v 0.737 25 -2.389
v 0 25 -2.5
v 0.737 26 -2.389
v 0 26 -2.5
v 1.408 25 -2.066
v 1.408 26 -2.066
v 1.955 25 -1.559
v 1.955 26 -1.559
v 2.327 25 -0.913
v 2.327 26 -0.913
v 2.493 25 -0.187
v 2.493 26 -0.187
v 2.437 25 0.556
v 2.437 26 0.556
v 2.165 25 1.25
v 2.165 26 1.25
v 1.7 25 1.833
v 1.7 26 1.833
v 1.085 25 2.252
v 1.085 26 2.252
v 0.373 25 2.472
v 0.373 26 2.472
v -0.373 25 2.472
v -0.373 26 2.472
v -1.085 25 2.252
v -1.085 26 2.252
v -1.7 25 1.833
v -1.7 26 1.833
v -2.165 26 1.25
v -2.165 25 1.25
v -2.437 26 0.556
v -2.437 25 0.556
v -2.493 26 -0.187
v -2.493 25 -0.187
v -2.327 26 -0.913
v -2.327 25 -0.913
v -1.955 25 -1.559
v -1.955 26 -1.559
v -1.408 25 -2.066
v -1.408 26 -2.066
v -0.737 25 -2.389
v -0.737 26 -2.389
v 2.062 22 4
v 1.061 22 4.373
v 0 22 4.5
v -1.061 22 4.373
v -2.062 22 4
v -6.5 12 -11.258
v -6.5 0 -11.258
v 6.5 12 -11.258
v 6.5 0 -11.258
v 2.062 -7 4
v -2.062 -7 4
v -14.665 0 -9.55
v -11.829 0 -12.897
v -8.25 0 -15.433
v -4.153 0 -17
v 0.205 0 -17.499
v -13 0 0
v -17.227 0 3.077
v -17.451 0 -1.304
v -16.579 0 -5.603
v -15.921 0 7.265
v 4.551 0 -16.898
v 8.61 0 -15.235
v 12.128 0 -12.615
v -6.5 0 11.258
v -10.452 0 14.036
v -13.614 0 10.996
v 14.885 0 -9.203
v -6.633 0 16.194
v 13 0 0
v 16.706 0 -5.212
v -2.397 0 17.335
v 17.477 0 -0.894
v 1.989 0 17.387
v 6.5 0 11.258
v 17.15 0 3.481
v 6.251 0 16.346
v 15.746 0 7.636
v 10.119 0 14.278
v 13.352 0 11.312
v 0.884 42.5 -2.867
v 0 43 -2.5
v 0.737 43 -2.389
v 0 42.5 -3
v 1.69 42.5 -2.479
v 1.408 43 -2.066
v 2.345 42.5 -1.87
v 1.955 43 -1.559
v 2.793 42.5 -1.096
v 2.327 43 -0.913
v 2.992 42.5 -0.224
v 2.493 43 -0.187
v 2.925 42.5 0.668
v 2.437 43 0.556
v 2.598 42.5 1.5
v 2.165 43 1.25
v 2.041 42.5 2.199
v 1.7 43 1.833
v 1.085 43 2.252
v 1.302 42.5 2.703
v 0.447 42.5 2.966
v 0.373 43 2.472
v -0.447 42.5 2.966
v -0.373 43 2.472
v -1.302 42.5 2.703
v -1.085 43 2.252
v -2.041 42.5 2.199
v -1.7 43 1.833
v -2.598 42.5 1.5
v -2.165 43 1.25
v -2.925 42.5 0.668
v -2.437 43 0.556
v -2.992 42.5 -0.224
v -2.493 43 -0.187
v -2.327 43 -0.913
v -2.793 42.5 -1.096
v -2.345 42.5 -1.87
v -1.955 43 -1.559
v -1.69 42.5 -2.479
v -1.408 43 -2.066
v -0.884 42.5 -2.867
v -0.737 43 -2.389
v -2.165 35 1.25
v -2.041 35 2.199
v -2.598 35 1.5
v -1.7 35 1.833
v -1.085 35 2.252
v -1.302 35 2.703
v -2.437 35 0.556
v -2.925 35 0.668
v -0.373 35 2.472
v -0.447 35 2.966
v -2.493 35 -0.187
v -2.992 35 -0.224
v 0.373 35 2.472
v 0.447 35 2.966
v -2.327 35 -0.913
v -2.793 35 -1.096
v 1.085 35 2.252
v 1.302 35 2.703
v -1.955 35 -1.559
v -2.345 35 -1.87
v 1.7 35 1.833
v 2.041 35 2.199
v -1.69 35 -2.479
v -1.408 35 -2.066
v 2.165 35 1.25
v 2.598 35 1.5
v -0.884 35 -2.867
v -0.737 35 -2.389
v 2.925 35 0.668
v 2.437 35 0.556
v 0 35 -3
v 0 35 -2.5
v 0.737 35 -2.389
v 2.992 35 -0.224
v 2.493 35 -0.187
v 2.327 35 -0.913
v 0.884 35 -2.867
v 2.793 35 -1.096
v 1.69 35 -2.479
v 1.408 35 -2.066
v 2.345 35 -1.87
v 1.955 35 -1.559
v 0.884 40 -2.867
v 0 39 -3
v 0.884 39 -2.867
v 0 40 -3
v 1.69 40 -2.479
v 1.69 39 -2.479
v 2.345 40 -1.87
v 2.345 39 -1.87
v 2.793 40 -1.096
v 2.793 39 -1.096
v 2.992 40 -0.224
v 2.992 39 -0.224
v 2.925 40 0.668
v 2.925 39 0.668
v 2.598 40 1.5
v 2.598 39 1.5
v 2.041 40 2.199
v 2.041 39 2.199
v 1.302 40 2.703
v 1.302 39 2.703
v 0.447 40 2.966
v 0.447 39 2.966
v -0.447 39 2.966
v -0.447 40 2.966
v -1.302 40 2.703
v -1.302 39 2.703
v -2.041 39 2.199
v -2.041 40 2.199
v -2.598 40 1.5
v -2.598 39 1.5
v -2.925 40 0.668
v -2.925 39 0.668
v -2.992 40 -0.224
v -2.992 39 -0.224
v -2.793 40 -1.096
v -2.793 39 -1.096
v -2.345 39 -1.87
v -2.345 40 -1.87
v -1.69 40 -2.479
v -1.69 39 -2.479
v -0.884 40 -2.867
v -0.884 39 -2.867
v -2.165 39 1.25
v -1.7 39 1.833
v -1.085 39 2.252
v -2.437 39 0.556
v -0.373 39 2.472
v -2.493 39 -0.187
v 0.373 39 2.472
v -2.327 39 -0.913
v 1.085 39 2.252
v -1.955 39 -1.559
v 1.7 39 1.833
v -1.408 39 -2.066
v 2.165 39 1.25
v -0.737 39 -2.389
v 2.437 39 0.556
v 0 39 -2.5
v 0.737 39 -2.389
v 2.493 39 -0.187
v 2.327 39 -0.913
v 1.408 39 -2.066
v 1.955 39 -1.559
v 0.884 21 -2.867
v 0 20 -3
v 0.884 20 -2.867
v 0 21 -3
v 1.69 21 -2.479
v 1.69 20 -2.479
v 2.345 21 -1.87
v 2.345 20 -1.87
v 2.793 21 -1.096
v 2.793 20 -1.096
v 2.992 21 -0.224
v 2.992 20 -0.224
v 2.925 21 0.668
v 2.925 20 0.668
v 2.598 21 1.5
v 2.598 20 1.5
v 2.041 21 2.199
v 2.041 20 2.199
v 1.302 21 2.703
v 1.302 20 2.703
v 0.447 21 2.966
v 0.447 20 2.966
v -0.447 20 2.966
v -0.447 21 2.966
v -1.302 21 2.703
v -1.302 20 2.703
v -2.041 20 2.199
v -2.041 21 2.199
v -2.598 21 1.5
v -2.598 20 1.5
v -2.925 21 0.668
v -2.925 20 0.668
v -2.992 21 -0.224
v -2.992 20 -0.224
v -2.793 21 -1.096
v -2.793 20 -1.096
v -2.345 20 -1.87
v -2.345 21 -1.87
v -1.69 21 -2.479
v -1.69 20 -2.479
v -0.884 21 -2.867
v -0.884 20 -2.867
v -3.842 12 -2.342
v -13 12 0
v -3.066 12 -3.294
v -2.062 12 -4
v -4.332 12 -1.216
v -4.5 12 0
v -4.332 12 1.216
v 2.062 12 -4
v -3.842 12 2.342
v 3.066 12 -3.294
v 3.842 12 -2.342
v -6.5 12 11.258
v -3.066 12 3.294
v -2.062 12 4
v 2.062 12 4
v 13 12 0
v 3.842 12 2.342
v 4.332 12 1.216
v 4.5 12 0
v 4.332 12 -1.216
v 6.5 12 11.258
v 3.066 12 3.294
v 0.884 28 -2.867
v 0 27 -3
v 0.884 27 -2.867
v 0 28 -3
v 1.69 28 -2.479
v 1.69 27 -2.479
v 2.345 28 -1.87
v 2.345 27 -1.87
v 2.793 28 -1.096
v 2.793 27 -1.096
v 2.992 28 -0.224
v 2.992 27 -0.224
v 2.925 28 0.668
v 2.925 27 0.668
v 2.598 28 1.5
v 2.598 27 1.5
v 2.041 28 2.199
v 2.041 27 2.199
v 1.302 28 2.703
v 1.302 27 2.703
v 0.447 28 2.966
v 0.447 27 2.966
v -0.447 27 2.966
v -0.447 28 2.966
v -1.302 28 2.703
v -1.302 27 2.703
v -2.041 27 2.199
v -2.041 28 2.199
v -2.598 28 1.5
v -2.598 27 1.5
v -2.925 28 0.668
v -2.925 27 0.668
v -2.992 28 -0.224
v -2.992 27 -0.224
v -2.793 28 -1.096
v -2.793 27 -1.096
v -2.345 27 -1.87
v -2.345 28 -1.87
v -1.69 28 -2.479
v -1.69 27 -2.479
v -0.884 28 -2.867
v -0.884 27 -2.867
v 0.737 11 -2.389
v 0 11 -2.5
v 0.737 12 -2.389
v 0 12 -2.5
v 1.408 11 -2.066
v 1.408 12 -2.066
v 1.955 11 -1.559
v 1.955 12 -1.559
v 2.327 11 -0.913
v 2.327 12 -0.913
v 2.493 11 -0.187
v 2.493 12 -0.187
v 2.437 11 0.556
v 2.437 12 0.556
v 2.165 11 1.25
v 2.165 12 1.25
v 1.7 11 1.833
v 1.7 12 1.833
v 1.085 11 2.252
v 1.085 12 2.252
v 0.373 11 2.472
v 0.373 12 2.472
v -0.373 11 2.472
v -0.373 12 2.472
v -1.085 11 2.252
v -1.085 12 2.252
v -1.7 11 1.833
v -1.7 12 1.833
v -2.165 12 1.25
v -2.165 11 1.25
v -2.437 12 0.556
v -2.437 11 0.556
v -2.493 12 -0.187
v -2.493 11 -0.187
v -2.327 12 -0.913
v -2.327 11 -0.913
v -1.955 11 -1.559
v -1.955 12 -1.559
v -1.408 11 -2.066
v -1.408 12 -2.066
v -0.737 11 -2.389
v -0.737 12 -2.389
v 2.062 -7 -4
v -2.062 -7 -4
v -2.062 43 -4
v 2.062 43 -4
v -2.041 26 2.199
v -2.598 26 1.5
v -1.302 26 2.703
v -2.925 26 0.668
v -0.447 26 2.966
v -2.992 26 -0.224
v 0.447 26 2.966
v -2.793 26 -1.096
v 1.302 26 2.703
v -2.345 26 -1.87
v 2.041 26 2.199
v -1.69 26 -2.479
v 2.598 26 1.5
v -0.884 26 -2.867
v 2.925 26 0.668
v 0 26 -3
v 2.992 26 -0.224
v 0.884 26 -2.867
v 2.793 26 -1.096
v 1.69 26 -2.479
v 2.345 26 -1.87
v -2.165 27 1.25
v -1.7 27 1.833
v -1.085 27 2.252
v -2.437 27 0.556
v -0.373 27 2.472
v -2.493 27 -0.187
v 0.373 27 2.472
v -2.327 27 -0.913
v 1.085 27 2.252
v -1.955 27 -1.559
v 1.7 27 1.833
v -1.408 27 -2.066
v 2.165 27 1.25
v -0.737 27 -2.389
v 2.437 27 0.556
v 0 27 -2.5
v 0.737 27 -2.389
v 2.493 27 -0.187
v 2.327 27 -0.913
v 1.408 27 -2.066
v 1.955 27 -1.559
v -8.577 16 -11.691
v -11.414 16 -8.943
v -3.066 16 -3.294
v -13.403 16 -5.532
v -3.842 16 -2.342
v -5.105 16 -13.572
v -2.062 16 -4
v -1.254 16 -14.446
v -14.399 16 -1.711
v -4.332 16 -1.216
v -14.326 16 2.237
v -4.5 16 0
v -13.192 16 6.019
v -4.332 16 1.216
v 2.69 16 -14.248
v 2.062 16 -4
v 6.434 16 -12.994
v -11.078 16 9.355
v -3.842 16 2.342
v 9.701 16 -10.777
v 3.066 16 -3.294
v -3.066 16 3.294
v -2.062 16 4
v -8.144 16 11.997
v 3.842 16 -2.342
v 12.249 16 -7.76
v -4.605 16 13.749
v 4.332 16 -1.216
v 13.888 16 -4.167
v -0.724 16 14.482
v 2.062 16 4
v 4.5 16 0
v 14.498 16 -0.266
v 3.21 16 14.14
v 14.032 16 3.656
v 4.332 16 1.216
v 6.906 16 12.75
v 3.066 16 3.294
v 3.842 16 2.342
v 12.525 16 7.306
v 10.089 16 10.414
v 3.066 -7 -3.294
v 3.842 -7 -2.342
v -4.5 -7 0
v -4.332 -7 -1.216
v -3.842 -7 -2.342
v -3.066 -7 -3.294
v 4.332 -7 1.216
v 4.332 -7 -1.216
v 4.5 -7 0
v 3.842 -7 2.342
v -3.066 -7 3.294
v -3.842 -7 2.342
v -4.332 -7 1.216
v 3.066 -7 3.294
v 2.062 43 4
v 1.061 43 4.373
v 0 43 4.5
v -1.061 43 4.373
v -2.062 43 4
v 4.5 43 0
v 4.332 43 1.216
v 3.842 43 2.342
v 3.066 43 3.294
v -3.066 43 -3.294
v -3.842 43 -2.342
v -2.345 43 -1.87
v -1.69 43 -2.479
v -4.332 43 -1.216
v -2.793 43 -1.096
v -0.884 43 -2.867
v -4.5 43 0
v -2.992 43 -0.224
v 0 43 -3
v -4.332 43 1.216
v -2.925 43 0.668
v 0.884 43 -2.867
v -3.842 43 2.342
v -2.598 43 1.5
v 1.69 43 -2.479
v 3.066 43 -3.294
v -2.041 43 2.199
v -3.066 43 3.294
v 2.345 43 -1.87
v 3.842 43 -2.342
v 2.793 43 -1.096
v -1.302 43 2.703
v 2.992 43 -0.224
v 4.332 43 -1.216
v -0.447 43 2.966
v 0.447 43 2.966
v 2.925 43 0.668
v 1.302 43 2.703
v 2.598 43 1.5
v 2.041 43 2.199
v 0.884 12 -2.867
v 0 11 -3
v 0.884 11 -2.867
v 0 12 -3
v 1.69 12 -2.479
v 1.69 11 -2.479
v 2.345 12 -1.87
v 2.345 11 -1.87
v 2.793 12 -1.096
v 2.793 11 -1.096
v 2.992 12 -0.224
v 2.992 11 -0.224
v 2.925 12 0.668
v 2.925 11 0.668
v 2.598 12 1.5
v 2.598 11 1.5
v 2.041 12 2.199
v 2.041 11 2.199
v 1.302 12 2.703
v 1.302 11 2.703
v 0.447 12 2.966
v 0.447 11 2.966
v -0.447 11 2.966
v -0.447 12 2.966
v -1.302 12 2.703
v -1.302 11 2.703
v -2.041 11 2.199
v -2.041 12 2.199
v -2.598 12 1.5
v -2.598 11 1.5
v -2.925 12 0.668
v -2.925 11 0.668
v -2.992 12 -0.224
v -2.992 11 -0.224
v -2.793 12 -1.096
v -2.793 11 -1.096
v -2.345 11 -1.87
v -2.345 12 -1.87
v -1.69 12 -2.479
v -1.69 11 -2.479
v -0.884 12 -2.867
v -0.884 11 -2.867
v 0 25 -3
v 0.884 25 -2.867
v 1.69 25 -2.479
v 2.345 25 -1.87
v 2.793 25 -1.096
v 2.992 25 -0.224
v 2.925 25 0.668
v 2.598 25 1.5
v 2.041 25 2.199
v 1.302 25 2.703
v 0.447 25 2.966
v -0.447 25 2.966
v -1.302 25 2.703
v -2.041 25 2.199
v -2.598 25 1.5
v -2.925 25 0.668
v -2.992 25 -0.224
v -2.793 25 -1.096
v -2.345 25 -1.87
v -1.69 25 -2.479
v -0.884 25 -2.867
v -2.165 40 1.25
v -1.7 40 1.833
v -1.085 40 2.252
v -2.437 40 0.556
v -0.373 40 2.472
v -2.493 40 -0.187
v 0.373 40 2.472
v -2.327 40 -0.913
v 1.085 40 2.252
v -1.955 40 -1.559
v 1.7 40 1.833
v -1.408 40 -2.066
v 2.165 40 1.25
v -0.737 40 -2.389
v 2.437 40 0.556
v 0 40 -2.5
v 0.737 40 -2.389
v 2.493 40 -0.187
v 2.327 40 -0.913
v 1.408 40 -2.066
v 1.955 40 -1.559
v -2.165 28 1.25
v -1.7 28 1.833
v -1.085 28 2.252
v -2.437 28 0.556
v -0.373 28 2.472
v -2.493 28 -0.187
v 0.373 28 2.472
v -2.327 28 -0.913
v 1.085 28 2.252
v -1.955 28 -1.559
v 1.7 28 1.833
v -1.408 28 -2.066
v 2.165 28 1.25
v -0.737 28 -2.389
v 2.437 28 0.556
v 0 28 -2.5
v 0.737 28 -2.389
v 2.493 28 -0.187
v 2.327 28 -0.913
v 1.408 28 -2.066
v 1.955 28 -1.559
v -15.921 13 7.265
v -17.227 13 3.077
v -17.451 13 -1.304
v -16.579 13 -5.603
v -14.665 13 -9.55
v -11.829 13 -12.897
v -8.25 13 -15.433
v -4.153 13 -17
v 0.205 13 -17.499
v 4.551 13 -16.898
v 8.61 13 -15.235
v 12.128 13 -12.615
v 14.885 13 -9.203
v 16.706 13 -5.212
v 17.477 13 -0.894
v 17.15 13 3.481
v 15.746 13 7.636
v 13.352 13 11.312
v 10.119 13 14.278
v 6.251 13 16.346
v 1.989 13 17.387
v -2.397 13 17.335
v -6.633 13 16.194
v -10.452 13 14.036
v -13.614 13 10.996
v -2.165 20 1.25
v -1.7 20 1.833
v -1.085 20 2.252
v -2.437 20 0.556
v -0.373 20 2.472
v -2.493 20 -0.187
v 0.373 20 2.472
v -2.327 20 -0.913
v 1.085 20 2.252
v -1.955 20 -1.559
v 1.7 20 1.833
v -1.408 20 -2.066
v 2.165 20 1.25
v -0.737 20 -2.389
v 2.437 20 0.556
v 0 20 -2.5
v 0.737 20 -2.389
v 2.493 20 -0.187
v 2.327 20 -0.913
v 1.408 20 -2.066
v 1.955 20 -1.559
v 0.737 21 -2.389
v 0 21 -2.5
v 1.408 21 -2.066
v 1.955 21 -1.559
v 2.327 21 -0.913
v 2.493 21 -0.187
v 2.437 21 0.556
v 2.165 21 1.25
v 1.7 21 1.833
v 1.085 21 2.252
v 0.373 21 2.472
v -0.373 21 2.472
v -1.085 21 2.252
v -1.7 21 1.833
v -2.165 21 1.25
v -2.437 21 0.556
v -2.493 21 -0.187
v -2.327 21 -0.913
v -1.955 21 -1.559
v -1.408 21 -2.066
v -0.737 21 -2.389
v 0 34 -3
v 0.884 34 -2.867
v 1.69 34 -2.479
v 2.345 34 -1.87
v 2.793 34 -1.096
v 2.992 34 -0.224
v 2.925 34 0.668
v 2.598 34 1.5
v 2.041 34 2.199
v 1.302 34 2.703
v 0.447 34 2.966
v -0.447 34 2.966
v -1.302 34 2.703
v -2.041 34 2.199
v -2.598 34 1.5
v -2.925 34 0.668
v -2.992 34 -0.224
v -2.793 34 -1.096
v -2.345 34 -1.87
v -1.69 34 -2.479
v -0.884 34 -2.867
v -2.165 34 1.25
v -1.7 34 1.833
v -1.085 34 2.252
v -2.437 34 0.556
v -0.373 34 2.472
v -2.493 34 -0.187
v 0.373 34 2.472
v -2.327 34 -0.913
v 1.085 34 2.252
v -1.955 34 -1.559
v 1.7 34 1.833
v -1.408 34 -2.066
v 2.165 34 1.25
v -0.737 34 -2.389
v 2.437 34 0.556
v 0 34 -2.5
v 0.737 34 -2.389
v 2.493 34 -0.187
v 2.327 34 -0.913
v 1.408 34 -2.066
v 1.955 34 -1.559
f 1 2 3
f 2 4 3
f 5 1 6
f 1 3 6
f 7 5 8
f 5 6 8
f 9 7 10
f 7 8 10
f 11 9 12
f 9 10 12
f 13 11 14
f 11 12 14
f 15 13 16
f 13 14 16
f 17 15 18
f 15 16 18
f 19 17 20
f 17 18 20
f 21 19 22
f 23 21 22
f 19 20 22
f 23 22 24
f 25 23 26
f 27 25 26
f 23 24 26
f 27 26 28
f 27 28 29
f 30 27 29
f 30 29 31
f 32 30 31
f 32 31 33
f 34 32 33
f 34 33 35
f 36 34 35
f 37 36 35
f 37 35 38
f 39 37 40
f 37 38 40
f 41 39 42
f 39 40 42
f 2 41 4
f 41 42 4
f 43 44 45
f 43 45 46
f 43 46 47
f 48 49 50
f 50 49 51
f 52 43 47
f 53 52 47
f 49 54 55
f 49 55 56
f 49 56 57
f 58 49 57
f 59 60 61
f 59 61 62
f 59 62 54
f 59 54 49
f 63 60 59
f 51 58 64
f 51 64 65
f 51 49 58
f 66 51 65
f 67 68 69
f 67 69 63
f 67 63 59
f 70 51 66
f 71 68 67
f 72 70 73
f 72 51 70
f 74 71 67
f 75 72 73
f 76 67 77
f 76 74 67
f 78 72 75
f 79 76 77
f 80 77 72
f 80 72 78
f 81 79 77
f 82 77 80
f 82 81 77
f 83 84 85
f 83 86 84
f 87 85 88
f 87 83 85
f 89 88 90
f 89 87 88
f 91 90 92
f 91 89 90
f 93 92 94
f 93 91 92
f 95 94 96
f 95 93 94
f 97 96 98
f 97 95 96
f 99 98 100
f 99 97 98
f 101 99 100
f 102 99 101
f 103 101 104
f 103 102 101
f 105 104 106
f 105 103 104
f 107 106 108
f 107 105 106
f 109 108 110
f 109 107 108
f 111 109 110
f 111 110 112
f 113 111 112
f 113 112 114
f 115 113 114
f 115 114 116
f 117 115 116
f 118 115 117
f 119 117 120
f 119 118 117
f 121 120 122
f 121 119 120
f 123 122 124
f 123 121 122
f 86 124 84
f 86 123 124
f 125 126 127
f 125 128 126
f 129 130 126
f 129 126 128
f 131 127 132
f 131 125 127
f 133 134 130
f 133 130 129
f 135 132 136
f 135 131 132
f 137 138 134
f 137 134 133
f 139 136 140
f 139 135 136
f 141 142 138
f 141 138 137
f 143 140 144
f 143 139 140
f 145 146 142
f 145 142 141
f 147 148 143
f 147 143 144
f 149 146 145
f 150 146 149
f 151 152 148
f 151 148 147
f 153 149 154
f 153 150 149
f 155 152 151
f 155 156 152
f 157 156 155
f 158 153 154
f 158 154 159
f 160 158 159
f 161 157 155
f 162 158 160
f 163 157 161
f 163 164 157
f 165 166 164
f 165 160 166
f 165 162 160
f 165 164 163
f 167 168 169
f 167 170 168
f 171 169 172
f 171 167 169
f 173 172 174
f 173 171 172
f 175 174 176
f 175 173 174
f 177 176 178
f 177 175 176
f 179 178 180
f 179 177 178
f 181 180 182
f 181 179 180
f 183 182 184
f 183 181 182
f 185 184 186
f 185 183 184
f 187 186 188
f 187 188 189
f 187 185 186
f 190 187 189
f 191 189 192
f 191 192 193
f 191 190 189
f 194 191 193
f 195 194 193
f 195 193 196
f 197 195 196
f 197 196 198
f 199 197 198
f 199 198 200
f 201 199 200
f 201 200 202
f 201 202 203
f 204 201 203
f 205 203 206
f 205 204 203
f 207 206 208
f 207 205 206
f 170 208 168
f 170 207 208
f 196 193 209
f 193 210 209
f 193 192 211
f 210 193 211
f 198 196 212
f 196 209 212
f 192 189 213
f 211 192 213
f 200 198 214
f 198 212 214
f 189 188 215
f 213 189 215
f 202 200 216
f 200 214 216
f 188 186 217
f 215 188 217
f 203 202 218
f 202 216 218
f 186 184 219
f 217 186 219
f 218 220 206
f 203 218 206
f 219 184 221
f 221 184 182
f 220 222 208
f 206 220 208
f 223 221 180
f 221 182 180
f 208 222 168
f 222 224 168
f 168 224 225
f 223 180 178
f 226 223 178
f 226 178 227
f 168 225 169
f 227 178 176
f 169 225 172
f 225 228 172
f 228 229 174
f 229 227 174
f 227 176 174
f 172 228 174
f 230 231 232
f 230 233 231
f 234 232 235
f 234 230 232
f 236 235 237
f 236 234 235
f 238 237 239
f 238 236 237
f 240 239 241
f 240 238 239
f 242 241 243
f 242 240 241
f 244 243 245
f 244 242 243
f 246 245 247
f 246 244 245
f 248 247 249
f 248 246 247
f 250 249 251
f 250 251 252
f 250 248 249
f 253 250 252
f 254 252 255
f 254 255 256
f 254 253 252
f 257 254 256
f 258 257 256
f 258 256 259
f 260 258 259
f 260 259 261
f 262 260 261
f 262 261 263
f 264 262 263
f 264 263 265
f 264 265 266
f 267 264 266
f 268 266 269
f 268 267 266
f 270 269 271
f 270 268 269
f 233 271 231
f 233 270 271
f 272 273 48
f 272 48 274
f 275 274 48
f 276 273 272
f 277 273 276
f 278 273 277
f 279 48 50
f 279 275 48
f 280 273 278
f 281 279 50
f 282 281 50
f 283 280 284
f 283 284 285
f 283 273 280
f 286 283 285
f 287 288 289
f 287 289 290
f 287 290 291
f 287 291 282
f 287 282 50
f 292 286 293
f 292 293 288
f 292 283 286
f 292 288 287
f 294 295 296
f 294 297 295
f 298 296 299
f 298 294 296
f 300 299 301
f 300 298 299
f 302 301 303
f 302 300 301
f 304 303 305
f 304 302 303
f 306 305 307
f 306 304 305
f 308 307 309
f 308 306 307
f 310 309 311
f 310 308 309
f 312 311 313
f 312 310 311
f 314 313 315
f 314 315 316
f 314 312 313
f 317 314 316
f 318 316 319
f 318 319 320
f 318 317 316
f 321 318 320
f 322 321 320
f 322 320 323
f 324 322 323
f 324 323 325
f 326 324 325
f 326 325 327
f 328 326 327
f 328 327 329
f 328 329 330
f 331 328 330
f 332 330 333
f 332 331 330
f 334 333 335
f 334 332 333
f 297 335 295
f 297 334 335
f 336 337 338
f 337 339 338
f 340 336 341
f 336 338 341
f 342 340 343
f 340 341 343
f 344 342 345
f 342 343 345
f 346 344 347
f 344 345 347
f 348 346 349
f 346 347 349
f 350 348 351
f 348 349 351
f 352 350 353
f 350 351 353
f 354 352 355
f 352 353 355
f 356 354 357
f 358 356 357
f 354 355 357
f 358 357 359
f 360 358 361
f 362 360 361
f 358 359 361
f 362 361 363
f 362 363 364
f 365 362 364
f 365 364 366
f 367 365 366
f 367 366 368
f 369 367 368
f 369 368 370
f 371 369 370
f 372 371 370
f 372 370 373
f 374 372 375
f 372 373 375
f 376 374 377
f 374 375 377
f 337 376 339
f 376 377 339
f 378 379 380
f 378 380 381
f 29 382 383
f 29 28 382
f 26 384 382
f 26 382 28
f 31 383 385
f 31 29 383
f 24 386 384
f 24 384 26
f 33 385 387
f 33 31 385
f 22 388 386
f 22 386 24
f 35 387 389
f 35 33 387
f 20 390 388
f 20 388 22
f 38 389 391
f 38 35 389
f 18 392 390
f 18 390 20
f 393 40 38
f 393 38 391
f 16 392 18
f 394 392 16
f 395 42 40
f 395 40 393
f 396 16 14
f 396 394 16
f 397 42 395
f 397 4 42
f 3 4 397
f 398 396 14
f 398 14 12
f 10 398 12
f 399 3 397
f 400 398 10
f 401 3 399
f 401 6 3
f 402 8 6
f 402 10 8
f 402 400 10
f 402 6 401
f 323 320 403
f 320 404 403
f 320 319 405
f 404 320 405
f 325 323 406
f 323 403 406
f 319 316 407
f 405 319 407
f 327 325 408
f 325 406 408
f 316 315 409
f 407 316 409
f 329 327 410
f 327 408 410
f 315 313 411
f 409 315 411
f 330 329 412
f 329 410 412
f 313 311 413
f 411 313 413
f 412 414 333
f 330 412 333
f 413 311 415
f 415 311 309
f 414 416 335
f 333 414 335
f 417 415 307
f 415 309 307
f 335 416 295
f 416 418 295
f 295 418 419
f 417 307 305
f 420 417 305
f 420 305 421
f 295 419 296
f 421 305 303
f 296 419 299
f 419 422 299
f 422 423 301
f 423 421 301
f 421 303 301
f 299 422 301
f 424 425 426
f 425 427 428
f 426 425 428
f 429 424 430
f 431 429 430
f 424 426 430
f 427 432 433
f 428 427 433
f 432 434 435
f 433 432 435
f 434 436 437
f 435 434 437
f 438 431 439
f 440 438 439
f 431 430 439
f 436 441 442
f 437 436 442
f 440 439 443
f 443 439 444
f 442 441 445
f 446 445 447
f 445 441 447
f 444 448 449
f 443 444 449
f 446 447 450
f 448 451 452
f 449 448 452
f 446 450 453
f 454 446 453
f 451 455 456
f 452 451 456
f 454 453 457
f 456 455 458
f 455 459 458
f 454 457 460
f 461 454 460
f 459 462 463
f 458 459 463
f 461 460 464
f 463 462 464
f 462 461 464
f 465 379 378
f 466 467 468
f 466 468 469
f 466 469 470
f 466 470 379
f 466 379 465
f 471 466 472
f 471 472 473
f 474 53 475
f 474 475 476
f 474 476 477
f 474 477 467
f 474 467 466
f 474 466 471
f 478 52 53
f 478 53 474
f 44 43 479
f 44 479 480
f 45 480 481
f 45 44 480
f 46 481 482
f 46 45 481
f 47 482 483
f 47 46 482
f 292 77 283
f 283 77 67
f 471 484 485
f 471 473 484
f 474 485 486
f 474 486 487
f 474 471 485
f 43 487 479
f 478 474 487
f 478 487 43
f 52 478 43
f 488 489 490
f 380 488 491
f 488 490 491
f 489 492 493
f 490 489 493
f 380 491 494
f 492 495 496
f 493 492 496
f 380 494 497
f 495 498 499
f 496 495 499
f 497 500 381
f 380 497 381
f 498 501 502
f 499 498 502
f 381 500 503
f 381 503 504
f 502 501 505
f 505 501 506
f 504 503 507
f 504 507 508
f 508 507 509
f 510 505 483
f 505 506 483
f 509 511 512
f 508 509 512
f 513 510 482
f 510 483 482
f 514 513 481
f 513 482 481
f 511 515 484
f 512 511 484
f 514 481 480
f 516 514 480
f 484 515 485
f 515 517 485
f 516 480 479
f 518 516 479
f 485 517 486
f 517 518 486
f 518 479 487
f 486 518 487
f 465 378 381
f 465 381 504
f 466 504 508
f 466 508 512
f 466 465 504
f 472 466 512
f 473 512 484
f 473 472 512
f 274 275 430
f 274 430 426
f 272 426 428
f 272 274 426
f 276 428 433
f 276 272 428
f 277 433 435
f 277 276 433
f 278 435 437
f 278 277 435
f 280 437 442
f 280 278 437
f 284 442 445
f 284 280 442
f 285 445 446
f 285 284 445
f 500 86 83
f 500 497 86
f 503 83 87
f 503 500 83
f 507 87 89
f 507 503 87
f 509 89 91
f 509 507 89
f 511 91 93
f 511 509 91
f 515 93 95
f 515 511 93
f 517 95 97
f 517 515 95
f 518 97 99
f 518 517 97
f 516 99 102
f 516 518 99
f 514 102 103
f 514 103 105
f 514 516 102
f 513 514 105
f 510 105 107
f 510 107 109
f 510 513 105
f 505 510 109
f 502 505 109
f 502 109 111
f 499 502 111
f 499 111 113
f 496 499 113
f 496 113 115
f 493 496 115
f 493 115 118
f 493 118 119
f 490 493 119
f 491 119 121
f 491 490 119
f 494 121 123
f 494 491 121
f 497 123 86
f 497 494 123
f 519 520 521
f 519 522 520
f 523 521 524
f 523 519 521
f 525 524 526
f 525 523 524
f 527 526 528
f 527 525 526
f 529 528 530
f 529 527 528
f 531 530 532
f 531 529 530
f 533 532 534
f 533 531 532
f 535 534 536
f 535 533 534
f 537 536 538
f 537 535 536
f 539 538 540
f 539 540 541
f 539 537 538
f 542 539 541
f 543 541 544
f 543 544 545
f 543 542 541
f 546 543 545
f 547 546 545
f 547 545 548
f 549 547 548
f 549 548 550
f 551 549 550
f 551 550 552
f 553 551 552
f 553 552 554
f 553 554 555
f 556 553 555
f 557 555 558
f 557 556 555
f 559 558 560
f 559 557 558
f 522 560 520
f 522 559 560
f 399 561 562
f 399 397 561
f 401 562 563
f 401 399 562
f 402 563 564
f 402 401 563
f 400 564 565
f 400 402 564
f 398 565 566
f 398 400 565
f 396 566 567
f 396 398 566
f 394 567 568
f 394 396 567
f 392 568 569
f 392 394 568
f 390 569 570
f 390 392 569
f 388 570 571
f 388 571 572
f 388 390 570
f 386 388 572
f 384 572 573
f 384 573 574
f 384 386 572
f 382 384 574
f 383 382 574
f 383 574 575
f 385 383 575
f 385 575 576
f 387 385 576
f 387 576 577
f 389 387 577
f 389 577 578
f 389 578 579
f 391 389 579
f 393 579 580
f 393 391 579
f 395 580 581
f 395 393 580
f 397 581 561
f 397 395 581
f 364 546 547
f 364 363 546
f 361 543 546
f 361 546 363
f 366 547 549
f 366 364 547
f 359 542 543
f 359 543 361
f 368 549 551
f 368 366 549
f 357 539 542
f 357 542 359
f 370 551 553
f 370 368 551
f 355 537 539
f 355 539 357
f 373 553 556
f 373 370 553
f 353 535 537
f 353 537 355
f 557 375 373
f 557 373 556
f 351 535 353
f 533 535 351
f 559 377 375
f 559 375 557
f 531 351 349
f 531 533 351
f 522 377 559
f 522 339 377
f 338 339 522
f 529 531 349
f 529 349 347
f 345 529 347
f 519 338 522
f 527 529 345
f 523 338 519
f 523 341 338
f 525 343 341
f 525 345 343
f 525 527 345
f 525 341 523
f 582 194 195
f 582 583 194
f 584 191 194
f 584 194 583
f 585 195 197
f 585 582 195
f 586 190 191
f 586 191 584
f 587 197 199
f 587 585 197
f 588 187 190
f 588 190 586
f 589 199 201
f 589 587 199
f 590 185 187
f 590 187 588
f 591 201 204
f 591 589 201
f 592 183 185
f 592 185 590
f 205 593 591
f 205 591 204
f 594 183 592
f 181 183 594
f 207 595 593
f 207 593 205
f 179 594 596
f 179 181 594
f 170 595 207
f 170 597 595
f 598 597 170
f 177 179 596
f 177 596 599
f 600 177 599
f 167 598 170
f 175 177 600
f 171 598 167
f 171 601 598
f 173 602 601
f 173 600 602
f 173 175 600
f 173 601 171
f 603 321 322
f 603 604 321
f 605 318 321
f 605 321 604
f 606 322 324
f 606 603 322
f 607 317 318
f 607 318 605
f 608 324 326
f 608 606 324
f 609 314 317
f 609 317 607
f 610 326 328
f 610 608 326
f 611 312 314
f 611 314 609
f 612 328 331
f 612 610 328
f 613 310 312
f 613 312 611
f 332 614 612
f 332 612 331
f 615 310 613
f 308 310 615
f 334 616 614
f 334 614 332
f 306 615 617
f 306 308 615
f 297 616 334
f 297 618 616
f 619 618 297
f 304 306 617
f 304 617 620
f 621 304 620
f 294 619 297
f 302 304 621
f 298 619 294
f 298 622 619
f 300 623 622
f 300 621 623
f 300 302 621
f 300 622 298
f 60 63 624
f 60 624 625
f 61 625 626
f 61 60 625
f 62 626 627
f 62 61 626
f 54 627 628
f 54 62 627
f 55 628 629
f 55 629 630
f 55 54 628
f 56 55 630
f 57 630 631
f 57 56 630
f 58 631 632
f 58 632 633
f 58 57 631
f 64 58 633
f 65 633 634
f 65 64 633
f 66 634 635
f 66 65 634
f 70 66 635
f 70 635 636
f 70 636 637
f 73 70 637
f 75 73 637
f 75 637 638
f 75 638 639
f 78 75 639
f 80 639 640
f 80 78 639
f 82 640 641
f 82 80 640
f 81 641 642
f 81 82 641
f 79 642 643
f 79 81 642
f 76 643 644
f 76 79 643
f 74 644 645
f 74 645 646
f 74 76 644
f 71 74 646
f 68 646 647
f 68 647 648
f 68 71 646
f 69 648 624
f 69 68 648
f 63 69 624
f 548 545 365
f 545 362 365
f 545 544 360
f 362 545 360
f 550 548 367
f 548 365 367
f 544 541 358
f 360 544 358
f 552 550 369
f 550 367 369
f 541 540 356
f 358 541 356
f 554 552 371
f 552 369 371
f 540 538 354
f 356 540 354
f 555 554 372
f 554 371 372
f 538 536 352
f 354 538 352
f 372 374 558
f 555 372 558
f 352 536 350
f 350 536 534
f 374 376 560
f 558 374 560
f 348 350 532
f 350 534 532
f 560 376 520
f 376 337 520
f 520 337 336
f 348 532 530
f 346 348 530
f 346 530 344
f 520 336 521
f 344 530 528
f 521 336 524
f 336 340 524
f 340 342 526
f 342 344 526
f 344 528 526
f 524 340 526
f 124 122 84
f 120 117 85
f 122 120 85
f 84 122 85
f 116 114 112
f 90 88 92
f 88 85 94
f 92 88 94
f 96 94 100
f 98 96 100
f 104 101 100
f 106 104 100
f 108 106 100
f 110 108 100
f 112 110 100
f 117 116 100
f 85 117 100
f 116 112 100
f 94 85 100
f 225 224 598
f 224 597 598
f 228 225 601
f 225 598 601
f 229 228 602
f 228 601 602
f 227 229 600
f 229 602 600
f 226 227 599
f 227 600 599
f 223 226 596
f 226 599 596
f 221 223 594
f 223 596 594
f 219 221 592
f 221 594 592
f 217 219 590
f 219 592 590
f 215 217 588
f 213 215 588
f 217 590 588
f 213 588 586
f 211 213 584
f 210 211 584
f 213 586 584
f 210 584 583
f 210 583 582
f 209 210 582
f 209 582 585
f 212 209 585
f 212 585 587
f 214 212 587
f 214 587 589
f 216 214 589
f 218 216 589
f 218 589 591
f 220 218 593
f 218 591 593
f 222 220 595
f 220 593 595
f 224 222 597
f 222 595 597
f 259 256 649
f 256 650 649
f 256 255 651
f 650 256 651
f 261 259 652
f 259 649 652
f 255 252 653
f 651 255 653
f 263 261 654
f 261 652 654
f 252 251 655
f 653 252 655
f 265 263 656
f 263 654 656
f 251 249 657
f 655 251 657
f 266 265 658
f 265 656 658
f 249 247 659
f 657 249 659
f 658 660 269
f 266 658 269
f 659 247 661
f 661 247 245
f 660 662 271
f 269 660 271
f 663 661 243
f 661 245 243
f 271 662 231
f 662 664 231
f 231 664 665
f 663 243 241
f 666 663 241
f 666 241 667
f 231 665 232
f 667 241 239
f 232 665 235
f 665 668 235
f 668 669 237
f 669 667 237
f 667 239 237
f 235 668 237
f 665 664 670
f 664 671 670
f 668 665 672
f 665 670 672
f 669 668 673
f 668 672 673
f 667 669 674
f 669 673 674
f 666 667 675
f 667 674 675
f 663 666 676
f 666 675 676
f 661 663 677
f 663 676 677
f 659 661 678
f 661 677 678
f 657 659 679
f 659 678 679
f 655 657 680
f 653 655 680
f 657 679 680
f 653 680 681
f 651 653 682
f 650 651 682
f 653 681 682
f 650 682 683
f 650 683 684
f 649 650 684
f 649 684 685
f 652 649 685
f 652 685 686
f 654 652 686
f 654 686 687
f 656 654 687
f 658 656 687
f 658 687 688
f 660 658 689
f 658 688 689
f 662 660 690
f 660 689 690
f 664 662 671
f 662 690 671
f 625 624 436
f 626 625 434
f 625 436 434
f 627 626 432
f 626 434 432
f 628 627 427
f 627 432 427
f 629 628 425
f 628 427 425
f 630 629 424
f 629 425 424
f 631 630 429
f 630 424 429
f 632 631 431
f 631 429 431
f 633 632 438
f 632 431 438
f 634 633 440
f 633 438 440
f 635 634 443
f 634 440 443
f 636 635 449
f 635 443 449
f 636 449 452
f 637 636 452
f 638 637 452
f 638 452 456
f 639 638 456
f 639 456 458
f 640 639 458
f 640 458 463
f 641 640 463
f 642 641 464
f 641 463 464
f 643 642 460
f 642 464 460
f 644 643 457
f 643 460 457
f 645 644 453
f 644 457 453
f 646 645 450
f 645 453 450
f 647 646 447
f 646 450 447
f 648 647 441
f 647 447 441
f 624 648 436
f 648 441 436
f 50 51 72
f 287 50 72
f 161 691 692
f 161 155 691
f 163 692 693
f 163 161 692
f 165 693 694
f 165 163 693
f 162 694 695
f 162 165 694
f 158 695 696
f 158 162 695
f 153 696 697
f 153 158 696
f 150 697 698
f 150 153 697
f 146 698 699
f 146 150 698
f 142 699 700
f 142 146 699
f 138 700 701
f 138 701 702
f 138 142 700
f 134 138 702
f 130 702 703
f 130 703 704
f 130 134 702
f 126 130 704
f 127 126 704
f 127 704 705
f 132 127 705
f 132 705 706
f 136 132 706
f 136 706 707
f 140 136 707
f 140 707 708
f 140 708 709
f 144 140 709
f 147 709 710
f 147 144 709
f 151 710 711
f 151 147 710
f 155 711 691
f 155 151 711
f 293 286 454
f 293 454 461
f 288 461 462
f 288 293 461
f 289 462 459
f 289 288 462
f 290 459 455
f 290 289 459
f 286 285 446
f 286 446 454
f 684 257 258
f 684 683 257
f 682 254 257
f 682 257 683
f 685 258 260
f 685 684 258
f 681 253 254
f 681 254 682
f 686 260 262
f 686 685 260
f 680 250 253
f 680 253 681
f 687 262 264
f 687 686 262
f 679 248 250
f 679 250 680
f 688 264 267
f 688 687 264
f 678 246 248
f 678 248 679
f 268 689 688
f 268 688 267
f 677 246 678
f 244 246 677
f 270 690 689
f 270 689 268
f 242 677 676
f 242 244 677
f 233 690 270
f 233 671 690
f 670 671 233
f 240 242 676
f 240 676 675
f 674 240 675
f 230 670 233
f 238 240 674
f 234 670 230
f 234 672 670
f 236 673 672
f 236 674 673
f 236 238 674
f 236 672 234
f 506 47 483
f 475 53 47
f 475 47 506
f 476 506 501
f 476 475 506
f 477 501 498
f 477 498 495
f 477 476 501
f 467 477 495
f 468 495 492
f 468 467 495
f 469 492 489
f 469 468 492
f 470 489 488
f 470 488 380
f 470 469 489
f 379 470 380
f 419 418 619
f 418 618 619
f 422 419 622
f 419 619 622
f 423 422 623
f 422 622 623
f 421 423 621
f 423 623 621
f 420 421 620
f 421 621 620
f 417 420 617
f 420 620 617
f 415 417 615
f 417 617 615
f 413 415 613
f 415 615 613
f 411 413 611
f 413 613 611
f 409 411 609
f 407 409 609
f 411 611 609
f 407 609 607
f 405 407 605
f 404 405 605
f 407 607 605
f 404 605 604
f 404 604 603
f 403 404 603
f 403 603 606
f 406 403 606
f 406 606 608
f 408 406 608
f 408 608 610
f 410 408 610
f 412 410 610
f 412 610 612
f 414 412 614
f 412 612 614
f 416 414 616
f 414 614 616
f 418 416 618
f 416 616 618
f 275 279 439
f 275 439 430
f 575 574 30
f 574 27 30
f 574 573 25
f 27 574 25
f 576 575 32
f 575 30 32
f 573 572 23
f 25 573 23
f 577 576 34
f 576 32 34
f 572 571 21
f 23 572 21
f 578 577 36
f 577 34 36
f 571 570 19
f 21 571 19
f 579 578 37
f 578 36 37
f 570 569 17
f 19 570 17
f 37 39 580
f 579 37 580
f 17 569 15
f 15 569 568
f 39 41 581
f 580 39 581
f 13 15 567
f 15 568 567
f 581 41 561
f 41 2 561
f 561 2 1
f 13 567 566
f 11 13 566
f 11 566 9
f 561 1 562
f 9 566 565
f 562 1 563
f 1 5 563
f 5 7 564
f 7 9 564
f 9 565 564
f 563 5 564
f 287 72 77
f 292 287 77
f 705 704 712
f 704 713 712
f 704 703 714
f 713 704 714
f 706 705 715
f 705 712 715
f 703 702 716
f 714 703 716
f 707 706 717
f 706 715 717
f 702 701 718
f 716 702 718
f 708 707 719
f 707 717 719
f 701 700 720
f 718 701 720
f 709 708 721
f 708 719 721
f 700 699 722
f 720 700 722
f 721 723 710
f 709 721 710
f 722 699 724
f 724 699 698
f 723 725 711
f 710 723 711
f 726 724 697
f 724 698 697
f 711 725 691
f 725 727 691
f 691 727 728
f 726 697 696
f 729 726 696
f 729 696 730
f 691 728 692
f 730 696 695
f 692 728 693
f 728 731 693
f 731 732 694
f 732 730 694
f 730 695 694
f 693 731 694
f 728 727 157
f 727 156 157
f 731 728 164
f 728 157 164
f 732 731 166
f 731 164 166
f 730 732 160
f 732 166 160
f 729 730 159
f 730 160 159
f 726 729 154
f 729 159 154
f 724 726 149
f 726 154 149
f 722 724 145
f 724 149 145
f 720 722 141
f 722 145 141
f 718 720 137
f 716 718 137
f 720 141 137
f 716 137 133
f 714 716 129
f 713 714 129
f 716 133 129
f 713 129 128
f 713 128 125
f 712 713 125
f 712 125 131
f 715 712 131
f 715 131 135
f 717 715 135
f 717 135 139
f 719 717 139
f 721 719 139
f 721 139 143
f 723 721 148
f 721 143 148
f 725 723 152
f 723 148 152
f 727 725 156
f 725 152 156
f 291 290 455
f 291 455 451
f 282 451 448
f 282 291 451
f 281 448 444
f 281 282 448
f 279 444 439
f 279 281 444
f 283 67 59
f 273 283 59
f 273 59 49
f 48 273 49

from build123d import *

# Parameters (mm, degrees)
F1_DEPTH      = 16
F2_DEPTH      = 12
F3_SIZE       = 3
F4_DEPTH      = 7
F4_DEPTH_BACK = 22
F5_START      = -22
F5_DEPTH      = 21
F6_W          = 1
F6_H          = 0.5


# Not quite as in the source:
# - a feature names something its author has since deleted; it is built from what else it names


with BuildPart() as f1:
    # F0 (on Front) → F1 (new body)
    with BuildSketch(Plane.XZ):
        with BuildLine():
            ThreePointArc((1.668909711, 17.4202393892), (-8.75, 15.1554445662), (-15.9208247065, 7.2648014882))
            ThreePointArc((-15.9208247065, 7.2648014882), (8.75, -15.1554445662), (1.668909711, 17.4202393892))
        make_face()
        Polygon((-13, 0), (-6.5, 11.2583302492), (6.5, 11.2583302492), (13, 0), (6.5, -11.2583302492), (-6.5, -11.2583302492), align=None, mode=Mode.SUBTRACT)
        Polygon((6.5, 11.2583302492), (-6.5, 11.2583302492), (-13, 0), (-6.5, -11.2583302492), (6.5, -11.2583302492), (13, 0), align=None)
        with BuildLine():
            ThreePointArc((-2.0615528128, -4), (-4.5, 0), (-2.0615528128, 4))
            ThreePointArc((-2.0615528128, 4), (0, 4.5), (2.0615528128, 4))
            ThreePointArc((2.0615528128, 4), (3.8423292192, 2.3423292192), (4.5, 0))
            ThreePointArc((4.5, 0), (3.8423292192, -2.3423292192), (2.0615528128, -4))
            ThreePointArc((2.0615528128, -4), (0, -4.5), (-2.0615528128, -4))
        make_face(mode=Mode.SUBTRACT)
        with BuildLine():
            ThreePointArc((2.0615528128, 4), (0, 4.5), (-2.0615528128, 4))
            Line((-2.0615528128, 4), (2.0615528128, 4))
        make_face()
        with BuildLine():
            Line((2.0615528128, -4), (-2.0615528128, -4))
            ThreePointArc((-2.0615528128, -4), (0, -4.5), (2.0615528128, -4))
        make_face()
    extrude(amount=-F1_DEPTH)

    # F0 (on Front) → F2 (cut)
    with BuildSketch(Plane.XZ):
        Polygon((6.5, 11.2583302492), (-6.5, 11.2583302492), (-13, 0), (-6.5, -11.2583302492), (6.5, -11.2583302492), (13, 0), align=None)
        with BuildLine():
            ThreePointArc((-2.0615528128, -4), (-4.5, 0), (-2.0615528128, 4))
            ThreePointArc((-2.0615528128, 4), (0, 4.5), (2.0615528128, 4))
            ThreePointArc((2.0615528128, 4), (3.8423292192, 2.3423292192), (4.5, 0))
            ThreePointArc((4.5, 0), (3.8423292192, -2.3423292192), (2.0615528128, -4))
            ThreePointArc((2.0615528128, -4), (0, -4.5), (-2.0615528128, -4))
        make_face(mode=Mode.SUBTRACT)
        with BuildLine():
            ThreePointArc((2.0615528128, 4), (0, 4.5), (-2.0615528128, 4))
            Line((-2.0615528128, 4), (2.0615528128, 4))
        make_face()
        with BuildLine():
            Line((2.0615528128, -4), (-2.0615528128, -4))
            ThreePointArc((-2.0615528128, -4), (0, -4.5), (2.0615528128, -4))
        make_face()
    extrude(amount=-F2_DEPTH, mode=Mode.SUBTRACT)

    # F3
    f3_edges = [f1.edges().sort_by_distance(p)[0] for p in [
        (-1.66891, 16, -17.420239),
    ]]
    chamfer(f3_edges, length=F3_SIZE)


with BuildPart() as f4:
    # F0 (on Front) → F4 (new body, two sides)
    with BuildSketch(Plane.XZ) as f4_sk:
        with BuildLine():
            Line((2.0615528128, 4), (-2.0615528128, 4))
            ThreePointArc((-2.0615528128, 4), (-4.5, 0), (-2.0615528128, -4))
            Line((-2.0615528128, -4), (2.0615528128, -4))
            ThreePointArc((2.0615528128, -4), (3.8423292192, -2.3423292192), (4.5, 0))
            ThreePointArc((4.5, 0), (3.8423292192, 2.3423292192), (2.0615528128, 4))
        make_face()
    extrude(amount=F4_DEPTH)
    extrude(f4_sk.sketch, amount=-F4_DEPTH_BACK)

    # F0 (on Front) → F5 (join)
    with BuildSketch(Plane.XZ.offset(F5_START)):
        with BuildLine():
            Line((2.0615528128, 4), (-2.0615528128, 4))
            ThreePointArc((-2.0615528128, 4), (-4.5, 0), (-2.0615528128, -4))
            Line((-2.0615528128, -4), (2.0615528128, -4))
            ThreePointArc((2.0615528128, -4), (3.8423292192, -2.3423292192), (4.5, 0))
            ThreePointArc((4.5, 0), (3.8423292192, 2.3423292192), (2.0615528128, 4))
        make_face()
        with BuildLine():
            ThreePointArc((2.0615528128, 4), (0, 4.5), (-2.0615528128, 4))
            Line((-2.0615528128, 4), (2.0615528128, 4))
        make_face()
    extrude(amount=-F5_DEPTH)

    # F6 (on Right) → F7 (revolve, cut)
    with BuildSketch(Plane.YZ):
        with Locations((11.5, -2.75)):
            Rectangle(F6_W, F6_H)
        with Locations((20.5, -2.75)):
            Rectangle(F6_W, F6_H)
        with Locations((25.5, -2.75)):
            Rectangle(F6_W, F6_H)
        with Locations((27.5, -2.75)):
            Rectangle(F6_W, F6_H)
        with Locations((34.5, -2.75)):
            Rectangle(F6_W, F6_H)
        with Locations((39.5, -2.75)):
            Rectangle(F6_W, F6_H)
        Polygon((43, -3), (43, -2.5), (42.5, -3), align=None)
    revolve(axis=Axis((0, 43, 0), (0, -1, 0)), mode=Mode.SUBTRACT)


solid = Compound([f1.part, f4.part])
